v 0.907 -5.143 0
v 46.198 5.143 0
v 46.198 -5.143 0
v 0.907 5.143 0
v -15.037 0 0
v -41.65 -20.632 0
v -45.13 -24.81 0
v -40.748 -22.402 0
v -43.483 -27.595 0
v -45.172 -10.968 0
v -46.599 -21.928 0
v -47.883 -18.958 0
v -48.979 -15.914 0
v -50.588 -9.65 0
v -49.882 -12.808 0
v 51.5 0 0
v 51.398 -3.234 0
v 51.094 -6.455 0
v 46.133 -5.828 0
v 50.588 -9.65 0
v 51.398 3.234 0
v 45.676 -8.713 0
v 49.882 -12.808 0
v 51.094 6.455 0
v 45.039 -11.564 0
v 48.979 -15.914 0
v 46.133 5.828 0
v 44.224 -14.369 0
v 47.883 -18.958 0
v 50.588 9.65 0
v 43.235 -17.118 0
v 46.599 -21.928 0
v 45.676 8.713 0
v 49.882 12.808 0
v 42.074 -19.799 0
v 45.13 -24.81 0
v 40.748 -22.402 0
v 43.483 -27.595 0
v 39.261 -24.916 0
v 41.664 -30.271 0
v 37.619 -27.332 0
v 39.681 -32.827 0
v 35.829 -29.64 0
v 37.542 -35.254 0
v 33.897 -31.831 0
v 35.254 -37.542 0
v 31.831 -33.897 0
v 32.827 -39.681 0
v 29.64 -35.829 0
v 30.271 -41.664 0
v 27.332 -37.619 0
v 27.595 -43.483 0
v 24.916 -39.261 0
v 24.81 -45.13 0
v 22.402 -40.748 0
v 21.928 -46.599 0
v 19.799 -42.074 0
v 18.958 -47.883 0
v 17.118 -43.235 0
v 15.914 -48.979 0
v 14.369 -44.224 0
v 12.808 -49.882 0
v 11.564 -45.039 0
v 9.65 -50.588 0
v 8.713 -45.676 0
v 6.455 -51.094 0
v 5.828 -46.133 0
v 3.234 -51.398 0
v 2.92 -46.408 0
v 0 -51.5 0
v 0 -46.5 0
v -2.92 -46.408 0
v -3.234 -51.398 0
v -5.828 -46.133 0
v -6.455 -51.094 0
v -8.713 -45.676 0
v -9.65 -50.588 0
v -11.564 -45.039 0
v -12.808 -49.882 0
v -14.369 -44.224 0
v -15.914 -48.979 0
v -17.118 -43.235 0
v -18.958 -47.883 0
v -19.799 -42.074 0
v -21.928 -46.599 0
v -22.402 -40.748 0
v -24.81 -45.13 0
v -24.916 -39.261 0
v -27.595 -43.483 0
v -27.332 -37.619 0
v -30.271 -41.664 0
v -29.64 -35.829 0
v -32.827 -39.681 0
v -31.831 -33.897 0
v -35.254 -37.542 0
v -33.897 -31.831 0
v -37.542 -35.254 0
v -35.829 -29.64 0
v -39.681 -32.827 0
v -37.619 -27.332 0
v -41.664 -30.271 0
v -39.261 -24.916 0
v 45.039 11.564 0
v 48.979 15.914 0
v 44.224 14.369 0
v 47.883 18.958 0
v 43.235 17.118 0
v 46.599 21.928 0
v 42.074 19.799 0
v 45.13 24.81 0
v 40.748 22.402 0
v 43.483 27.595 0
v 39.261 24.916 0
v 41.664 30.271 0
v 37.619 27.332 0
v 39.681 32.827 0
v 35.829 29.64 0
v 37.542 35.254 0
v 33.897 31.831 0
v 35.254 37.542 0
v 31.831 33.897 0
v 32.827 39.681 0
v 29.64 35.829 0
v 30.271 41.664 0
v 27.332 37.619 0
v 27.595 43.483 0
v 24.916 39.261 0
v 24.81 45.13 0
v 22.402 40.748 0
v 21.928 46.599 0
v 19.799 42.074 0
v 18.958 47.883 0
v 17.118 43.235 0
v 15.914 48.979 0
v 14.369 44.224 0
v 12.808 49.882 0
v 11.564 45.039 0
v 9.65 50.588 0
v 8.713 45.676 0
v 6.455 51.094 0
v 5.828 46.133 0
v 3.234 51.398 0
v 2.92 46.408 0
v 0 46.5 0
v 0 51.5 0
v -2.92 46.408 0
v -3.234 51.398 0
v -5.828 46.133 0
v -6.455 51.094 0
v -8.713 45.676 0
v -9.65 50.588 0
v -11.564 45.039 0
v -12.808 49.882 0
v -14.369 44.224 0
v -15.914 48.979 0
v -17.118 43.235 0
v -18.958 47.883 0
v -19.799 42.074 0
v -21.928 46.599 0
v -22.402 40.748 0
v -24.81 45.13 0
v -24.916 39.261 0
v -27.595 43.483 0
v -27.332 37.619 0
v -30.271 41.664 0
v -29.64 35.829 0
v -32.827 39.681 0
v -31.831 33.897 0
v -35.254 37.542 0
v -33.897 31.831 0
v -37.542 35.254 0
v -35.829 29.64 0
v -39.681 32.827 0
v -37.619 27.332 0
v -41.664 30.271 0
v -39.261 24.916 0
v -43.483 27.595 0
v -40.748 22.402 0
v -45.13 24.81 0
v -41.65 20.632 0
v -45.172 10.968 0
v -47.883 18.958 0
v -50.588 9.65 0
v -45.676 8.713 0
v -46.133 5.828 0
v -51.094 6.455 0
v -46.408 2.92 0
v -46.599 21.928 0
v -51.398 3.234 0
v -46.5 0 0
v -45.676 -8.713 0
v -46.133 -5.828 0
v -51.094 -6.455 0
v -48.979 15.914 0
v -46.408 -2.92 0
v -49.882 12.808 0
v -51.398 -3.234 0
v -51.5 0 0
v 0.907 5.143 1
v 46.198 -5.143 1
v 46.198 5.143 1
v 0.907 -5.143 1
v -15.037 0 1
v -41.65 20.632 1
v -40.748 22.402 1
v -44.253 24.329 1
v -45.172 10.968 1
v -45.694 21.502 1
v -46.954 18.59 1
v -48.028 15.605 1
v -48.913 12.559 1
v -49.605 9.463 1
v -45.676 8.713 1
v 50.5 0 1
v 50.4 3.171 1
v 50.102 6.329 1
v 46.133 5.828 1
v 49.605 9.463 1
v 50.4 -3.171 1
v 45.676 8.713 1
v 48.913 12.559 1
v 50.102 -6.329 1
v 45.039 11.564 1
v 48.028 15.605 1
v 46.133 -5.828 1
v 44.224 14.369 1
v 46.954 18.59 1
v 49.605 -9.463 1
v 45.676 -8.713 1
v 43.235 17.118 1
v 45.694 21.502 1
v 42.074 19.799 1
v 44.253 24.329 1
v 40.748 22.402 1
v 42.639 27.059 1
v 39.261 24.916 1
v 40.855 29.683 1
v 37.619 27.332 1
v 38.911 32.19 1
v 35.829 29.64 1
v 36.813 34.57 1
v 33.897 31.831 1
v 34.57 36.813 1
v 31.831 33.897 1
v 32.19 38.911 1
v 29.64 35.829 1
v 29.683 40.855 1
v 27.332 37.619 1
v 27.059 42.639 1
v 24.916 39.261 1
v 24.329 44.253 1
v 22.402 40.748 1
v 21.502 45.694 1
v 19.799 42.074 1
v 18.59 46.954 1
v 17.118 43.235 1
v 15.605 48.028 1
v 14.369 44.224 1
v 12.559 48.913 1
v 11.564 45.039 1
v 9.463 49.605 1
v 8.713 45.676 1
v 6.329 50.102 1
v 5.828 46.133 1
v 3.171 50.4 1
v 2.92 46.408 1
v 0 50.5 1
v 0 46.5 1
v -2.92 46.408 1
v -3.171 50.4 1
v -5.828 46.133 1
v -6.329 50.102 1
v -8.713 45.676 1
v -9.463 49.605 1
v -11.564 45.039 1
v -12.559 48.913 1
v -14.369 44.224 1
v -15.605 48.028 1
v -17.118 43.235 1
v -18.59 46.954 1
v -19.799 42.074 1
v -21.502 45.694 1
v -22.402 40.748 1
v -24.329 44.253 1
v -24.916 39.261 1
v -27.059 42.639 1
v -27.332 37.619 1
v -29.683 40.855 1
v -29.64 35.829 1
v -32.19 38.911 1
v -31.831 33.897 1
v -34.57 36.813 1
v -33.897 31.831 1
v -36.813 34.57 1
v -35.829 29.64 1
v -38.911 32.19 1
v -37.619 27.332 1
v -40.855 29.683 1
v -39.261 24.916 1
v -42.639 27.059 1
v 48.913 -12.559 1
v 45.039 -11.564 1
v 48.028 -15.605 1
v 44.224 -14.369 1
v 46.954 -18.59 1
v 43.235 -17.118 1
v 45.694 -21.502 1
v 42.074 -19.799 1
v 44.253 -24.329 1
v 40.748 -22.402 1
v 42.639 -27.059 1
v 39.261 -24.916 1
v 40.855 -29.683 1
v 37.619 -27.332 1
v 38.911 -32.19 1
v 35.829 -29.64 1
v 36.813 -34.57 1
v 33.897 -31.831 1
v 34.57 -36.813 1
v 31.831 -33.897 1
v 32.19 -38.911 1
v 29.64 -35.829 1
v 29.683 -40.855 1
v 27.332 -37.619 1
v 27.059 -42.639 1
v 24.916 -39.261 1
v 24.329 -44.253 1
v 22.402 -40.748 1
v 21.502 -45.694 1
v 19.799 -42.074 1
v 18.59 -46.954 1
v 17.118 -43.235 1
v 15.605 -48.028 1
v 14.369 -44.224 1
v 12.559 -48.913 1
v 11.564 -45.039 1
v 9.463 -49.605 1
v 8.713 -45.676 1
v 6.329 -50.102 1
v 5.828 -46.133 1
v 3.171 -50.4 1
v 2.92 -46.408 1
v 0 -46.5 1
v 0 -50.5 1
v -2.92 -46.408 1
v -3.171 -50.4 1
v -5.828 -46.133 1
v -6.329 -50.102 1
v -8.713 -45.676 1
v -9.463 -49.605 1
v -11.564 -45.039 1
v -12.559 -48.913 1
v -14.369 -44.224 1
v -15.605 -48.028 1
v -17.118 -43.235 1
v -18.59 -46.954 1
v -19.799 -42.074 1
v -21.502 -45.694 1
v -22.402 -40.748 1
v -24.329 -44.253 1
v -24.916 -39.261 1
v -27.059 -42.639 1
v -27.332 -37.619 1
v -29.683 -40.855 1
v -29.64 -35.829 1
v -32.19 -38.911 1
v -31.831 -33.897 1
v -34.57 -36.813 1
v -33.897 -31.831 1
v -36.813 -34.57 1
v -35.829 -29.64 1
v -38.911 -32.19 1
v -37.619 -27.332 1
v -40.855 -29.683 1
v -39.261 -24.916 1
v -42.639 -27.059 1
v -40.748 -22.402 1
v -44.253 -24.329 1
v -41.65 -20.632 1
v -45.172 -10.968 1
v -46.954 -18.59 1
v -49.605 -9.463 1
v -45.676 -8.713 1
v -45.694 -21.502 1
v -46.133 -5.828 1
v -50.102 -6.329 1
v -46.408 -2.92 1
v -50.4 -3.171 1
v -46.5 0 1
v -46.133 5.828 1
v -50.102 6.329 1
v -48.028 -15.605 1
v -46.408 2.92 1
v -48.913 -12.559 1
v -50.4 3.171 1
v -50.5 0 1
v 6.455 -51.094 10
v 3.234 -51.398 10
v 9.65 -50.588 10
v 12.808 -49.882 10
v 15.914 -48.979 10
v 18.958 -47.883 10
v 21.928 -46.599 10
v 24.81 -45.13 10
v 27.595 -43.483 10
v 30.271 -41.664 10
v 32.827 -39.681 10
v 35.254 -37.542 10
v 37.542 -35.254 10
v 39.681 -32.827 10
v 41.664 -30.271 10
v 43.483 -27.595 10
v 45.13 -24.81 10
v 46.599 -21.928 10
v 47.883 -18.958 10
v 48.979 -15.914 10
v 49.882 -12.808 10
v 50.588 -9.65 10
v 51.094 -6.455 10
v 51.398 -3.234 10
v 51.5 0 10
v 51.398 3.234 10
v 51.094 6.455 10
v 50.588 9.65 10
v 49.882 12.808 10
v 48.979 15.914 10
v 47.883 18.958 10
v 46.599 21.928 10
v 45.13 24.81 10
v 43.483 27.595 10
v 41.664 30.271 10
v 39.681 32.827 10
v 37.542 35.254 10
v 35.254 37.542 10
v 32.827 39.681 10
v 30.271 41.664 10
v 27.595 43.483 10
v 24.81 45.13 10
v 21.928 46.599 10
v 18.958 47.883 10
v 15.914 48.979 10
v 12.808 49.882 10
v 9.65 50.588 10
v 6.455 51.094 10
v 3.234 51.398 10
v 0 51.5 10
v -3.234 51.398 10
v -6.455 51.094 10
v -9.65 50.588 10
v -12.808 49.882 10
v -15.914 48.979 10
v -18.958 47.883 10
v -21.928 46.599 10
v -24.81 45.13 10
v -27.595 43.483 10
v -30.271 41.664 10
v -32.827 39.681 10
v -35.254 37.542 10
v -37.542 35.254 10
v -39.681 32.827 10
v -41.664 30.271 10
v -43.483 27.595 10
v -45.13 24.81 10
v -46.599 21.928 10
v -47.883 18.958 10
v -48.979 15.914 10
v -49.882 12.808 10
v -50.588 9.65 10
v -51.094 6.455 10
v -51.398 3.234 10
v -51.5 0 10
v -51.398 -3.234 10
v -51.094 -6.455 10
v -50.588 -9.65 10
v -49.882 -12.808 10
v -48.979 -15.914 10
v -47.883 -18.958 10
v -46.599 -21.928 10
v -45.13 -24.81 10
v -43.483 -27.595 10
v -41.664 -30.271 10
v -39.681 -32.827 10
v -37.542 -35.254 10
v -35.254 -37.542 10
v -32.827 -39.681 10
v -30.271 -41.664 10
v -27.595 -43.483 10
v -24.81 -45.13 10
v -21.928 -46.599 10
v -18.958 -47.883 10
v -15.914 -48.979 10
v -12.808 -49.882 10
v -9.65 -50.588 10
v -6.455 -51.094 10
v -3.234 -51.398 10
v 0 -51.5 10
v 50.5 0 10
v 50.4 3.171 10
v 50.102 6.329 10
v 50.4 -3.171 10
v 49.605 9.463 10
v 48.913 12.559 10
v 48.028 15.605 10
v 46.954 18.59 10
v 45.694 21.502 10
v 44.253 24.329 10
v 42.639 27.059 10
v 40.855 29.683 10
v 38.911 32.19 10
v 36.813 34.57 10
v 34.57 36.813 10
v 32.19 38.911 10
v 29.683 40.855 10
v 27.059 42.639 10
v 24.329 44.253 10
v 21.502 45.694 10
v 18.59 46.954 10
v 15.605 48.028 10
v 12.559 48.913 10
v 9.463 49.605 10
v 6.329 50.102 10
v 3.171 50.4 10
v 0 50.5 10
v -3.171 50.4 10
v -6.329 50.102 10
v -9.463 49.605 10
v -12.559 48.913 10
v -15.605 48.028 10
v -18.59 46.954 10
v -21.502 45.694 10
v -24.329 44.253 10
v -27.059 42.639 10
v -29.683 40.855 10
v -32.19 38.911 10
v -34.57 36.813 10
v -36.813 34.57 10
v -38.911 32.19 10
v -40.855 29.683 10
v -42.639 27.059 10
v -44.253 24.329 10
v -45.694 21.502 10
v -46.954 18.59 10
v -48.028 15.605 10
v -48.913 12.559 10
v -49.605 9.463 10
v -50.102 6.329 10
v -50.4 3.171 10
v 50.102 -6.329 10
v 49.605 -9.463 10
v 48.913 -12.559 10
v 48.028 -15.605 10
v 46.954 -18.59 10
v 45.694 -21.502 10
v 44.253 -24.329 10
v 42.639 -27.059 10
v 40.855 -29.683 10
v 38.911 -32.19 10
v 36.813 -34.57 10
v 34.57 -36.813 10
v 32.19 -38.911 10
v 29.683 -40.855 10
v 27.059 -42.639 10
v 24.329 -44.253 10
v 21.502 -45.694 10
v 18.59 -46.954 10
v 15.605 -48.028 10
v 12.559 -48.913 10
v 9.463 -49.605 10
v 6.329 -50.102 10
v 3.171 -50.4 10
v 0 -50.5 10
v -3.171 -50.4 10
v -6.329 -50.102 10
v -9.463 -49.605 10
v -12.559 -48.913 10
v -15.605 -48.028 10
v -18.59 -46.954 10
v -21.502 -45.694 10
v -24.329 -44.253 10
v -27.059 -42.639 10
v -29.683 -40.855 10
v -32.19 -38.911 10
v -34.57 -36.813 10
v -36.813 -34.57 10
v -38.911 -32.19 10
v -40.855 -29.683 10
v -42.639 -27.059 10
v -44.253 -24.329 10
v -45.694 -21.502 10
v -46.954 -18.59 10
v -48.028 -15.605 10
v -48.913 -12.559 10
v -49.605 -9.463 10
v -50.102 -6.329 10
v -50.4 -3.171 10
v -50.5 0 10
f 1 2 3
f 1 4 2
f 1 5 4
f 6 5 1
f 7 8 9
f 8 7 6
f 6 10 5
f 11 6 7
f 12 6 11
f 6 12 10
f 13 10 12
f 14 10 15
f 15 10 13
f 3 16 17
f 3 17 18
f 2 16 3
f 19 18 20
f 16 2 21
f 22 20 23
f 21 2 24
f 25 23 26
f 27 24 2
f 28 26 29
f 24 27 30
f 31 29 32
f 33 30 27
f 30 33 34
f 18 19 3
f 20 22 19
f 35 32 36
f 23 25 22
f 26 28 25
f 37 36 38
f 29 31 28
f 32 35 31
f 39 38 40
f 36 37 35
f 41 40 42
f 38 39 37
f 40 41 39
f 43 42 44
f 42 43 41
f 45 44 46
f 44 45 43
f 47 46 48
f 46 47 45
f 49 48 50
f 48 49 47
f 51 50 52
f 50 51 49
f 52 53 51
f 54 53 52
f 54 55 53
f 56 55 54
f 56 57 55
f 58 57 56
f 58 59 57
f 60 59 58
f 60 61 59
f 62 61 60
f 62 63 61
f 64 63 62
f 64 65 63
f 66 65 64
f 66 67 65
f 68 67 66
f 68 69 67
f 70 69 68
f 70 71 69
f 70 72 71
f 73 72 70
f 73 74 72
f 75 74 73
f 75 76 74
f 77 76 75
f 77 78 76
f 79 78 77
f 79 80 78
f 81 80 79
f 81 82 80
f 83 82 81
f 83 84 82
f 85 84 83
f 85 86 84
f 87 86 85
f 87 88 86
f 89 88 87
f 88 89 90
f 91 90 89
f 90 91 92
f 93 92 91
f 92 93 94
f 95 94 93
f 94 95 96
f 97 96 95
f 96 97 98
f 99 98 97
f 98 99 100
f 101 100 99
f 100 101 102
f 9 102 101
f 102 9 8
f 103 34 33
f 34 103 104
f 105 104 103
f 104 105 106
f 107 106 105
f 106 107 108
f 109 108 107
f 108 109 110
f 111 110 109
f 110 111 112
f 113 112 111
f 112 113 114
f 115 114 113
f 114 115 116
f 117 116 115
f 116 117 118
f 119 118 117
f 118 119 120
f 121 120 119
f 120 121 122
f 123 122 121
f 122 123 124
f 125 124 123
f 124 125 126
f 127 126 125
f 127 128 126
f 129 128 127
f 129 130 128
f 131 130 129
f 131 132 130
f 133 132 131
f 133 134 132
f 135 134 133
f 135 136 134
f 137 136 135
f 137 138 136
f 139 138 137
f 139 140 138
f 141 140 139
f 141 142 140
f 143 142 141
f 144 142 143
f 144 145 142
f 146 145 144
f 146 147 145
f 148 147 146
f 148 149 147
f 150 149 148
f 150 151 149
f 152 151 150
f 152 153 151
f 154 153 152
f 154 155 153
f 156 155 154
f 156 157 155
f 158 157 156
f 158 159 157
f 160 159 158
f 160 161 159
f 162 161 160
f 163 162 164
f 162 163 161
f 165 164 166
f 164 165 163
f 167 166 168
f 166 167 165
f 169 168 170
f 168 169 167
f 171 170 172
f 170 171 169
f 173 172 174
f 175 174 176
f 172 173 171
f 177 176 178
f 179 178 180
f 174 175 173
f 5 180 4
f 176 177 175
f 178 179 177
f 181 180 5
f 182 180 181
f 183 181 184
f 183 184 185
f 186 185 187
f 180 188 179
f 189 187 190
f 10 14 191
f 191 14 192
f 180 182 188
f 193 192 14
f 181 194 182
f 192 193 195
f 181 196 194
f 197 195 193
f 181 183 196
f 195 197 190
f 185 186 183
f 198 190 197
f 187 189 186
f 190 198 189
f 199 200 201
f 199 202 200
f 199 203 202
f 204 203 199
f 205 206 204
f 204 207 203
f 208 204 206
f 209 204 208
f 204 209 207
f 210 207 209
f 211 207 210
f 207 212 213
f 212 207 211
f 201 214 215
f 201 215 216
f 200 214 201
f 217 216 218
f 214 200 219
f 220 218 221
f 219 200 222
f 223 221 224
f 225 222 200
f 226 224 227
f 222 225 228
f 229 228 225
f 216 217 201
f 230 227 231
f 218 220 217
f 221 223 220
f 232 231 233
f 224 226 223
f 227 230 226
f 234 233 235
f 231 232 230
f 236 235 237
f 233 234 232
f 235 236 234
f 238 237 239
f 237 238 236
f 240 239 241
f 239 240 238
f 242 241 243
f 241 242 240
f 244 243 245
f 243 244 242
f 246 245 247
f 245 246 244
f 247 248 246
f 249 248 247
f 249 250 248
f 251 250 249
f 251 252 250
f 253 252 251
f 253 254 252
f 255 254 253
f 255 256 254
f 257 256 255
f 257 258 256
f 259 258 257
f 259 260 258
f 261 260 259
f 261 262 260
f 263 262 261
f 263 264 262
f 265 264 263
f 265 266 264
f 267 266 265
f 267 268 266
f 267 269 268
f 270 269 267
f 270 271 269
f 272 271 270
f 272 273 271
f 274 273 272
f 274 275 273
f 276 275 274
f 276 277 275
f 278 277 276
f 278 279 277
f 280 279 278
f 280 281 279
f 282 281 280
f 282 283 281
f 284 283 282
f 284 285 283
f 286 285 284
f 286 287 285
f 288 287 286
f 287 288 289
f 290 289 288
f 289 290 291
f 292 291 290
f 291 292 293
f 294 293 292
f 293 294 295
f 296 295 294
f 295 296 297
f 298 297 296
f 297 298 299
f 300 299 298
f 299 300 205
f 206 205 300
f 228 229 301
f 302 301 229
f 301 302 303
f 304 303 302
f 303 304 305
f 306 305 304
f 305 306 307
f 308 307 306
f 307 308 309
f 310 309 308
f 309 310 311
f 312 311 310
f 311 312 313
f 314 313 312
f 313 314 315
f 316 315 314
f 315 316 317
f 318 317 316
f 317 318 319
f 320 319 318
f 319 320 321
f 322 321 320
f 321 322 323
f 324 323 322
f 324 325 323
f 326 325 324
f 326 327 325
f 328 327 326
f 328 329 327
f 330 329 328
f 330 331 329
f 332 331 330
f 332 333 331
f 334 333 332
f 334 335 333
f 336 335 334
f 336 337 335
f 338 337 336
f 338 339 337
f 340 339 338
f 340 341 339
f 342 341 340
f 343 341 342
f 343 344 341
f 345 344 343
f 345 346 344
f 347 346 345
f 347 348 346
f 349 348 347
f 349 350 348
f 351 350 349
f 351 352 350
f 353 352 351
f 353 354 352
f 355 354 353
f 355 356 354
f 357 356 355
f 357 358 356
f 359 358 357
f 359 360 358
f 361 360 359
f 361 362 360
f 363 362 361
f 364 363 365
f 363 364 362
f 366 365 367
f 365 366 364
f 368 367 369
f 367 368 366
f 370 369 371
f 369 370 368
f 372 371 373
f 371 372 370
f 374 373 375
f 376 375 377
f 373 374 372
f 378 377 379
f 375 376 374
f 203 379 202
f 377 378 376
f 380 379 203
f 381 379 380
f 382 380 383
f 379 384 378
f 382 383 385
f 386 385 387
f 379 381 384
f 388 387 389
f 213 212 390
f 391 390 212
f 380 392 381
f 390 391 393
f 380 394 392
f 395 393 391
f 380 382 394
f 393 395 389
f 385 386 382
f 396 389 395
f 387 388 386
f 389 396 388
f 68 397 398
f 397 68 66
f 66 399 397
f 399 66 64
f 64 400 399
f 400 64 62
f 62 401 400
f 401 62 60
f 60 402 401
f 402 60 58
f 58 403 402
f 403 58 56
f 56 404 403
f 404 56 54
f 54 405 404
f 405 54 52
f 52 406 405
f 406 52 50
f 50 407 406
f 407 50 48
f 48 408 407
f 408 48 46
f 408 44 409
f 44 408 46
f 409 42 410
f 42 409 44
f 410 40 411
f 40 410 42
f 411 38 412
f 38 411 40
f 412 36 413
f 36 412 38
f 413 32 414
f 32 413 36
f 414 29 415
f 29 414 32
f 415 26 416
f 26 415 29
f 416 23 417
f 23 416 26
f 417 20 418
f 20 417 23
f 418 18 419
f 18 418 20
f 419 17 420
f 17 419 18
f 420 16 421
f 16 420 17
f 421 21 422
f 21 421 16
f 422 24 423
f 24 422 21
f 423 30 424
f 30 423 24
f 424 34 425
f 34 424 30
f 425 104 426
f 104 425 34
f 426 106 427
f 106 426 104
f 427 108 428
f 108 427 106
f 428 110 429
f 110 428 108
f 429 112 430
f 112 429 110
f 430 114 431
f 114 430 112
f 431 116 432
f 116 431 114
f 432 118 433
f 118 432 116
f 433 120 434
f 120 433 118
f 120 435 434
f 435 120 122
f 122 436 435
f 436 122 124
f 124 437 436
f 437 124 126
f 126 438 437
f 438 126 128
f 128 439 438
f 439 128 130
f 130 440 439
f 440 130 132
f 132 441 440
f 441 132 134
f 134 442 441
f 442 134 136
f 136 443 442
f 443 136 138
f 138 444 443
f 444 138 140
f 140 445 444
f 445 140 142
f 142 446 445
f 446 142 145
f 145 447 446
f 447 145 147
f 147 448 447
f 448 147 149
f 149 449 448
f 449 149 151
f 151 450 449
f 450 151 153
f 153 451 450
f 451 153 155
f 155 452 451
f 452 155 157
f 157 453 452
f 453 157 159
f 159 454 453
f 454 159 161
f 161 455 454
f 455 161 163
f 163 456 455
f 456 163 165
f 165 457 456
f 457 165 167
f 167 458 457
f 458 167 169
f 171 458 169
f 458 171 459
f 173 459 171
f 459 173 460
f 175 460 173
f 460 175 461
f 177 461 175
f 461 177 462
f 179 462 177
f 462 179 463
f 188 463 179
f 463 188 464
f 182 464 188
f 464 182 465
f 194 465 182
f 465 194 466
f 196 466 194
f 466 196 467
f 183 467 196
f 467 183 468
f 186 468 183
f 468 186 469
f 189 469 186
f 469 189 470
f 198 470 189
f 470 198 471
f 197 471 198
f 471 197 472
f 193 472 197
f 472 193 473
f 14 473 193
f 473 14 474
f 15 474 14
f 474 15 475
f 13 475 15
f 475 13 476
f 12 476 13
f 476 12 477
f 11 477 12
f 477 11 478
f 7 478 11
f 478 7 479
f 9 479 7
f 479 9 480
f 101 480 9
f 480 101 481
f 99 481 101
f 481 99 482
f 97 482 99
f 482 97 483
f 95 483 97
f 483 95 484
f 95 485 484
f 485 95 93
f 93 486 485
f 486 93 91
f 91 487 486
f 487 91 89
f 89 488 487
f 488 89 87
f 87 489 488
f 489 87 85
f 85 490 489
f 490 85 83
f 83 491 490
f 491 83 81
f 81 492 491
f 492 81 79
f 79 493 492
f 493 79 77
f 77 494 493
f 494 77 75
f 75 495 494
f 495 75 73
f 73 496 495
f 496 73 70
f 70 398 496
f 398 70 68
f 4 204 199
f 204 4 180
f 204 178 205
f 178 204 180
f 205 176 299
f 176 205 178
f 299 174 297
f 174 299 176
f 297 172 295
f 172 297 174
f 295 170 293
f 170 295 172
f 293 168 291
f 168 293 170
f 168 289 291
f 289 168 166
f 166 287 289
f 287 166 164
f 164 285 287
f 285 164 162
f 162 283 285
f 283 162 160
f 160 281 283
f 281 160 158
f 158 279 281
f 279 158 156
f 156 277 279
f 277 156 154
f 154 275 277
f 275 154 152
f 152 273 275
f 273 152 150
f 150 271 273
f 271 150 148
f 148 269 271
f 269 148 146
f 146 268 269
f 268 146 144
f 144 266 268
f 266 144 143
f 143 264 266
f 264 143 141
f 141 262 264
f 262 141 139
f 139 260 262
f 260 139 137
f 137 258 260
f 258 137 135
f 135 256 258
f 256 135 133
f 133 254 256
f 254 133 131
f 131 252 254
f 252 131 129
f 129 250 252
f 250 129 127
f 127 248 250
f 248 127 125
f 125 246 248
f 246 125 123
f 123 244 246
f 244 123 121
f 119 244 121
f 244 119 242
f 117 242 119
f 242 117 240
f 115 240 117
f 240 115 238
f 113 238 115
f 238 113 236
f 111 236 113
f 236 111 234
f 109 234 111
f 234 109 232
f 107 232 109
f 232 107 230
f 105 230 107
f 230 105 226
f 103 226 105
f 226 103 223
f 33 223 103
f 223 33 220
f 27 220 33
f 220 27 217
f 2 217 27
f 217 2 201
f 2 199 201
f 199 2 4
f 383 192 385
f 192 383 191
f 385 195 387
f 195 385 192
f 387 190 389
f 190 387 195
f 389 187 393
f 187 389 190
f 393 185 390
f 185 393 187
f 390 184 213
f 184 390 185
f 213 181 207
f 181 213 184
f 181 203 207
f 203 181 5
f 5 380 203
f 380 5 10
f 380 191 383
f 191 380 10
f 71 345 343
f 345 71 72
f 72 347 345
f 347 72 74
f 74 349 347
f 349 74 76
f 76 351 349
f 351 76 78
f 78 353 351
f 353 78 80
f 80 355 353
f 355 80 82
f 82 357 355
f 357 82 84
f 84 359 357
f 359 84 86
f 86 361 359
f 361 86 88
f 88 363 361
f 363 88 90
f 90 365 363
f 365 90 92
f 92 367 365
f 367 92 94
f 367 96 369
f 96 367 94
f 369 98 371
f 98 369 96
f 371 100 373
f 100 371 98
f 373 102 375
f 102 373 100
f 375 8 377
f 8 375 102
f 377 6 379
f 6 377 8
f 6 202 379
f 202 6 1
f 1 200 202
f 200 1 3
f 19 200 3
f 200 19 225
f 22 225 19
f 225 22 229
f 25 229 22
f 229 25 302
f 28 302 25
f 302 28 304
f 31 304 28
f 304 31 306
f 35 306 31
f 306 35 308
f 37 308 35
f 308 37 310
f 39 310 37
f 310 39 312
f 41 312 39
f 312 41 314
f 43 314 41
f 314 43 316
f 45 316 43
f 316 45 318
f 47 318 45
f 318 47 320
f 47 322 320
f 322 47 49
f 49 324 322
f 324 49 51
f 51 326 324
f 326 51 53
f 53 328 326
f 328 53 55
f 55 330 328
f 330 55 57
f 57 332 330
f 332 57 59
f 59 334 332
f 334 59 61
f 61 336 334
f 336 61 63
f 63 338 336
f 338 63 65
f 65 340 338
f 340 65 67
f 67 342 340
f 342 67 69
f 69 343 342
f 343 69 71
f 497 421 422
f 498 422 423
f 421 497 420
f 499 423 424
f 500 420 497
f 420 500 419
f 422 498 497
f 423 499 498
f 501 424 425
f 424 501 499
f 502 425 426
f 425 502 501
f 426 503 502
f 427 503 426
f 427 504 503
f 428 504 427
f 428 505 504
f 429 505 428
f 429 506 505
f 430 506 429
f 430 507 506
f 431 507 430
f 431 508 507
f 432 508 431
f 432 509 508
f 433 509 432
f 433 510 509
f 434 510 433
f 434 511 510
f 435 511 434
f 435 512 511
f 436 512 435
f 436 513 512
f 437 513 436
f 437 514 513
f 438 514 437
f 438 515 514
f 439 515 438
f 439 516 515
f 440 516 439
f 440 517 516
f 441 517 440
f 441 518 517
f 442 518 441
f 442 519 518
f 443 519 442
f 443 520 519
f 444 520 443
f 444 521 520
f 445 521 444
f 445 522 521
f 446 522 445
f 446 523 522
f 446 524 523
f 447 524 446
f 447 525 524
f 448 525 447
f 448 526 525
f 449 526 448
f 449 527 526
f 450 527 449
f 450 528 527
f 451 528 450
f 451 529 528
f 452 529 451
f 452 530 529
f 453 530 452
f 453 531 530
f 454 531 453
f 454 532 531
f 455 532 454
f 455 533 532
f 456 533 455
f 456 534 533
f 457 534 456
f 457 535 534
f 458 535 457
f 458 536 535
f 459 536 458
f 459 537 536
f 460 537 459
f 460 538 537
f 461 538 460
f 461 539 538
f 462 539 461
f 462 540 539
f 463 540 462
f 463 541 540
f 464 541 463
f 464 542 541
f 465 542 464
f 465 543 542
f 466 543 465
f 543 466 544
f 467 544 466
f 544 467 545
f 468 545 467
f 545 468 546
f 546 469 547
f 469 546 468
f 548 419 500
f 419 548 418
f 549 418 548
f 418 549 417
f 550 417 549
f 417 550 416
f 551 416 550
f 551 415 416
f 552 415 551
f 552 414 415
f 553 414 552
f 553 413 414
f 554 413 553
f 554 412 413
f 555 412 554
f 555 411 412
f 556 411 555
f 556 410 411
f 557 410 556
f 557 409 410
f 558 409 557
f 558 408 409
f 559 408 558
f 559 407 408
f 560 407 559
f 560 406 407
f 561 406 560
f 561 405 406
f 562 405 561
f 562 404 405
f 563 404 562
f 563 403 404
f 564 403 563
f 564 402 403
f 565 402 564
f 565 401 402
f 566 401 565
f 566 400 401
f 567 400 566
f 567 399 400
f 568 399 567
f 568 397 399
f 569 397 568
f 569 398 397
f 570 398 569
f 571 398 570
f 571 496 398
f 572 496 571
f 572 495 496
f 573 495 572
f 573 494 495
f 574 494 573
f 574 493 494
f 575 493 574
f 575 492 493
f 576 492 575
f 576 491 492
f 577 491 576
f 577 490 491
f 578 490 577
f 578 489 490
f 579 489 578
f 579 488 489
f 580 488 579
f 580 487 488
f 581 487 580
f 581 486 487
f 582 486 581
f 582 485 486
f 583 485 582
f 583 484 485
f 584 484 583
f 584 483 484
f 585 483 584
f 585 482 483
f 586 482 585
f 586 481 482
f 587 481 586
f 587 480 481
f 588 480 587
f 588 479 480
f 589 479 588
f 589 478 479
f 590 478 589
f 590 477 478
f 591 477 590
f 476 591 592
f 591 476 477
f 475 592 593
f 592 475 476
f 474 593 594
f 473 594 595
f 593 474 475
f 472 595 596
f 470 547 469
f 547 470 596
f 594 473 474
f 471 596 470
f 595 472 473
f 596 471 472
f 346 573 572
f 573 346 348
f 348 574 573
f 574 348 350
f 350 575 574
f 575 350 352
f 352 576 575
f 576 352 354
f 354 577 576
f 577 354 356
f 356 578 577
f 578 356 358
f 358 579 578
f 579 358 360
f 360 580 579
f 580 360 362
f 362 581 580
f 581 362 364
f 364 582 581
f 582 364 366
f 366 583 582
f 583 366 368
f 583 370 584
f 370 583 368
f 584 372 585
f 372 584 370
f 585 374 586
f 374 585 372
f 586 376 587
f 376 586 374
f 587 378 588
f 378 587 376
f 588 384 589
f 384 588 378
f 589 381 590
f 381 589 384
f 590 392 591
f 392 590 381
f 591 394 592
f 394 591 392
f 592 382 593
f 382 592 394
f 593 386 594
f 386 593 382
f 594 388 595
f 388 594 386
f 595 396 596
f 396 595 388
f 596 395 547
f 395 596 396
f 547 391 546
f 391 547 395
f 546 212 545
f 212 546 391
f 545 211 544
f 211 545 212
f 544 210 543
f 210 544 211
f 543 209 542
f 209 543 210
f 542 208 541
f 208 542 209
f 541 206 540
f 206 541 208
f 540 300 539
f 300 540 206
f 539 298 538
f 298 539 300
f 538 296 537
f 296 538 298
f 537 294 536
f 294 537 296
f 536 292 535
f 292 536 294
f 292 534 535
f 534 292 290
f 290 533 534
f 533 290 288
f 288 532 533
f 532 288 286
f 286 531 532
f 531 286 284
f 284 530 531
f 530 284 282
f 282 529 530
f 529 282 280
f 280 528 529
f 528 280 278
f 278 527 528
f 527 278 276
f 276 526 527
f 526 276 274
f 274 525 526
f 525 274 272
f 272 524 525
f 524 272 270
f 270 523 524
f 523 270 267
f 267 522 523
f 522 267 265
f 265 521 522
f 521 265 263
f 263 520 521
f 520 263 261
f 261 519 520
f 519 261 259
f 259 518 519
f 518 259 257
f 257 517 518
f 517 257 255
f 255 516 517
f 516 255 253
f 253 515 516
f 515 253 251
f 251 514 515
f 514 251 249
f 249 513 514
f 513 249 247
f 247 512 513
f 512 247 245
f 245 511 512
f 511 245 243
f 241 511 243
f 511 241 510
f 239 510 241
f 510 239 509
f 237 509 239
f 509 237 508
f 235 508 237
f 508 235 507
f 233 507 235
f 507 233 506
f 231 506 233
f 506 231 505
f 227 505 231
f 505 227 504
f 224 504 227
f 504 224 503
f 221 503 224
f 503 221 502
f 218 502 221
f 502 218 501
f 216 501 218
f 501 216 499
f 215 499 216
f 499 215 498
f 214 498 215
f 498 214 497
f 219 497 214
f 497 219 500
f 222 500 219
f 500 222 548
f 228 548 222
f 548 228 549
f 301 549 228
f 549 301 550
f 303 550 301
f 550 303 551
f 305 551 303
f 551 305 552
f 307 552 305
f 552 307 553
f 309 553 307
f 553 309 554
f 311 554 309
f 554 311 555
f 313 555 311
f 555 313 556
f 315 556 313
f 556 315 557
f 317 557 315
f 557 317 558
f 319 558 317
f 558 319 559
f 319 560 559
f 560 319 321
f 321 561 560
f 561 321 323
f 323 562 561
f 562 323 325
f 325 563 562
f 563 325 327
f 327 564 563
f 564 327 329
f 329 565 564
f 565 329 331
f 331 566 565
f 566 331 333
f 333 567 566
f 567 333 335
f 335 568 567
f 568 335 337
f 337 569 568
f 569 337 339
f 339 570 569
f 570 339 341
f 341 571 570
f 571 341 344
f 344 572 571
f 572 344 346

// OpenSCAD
/*
   Y (Lord) Mask
   Andrew Lin, November 2021
*/


/********************
   Settings. 
*********************/

/*
   Number of facets to use when creating shapes. Larger is smoother,
   but will take longer to compute.
*/
$fn = 100;

/*
   Focal length of OTA in millimeters.
   Focal length is the diameter of the main objective multiplied by
   the f-ratio of the OTA. e.g. for an Orion ST80, which has an
   80mm objective, and an f-ratio of 5, the focal length is 400mm.
   (80mm * 5 = 400mm). This value is used the computing the
   thickness of the bars.
*/
focal_length = 400;

/*
   Angle of rotation for angled bars, in degrees.
   The amount to rotate the "off axis" slits. Traditionally, it's
   20 degrees, but you can use whatever value makes focusing easier
   for you.
*/
theta = 20;

/*
   The minimum slit width to print in millimeters. This can be the size of a
   slit your printer can print around without gumming up the slit, or something
   significantly larger if you want a more robust mask that won't easily break.
   The minimum value is probably slightly larger than your print head nozzle
   diameter. This actual width may be slightly larger, based on the step size
   calculation.
*/
minimum_width = 5;

/*
   Diameter of the thing the mask has to fit over, in millimeters.
   This is most likely the outer diameter of the OTA at the
   objective, or end of the lens hood.
*/
ota_diameter = 100;

/*
   Amount of total extra space between the cap's wall and the OTA it
   is going over, in millimeters.
*/
padding = 1;

/*
   Thickness of the mask's outer wall, in millimeters.
*/
wall_thickness = 1;

/*
   Height of the outer wall, in millimeters.
*/
wall_height = 10;

/*
   Thickness of the face of the mask, in millimeters.
*/
face_thickness = 1;

/*
   Width of the solid area on the face between the wall and the
   mask in millimeters.
*/
shoulder = min(10, 0.1 * ota_diameter);


/********************
   Computed Values.
*********************/

/*
   Bahtinov Mask step size formula is from 
   https://www.cloudynights.com/topic/178843-revolutionary-new-way-of-focusing-no-less/
   
   s = f / N
   where
     s = step size.
     f = focal length of OTA.
     N = magic number in [150, 200]
   The step size is the distance for a slit and the following bar, so
   the width of the slit (and the surrounding solids) is s / 2.
   
   The Y-Mask maximizes aperture by removing the grid of slits,
   leaving a single solid of width s / 2 for each set of slits.
*/

/*
   Returns the minimum step size for the mask slits. The conditional
   is whether or not a slit can be printed or not. If the step size
   is too small for the printer, the third-order spectrum. Keep
   increasing to the next third-order spectrum until the slits size
   is printable.
   
   Args:
      s - current step size.
*/
function step_size(s) = s < 2 * minimum_width ? 
    step_size(3 * s) : 
    s;

N = 175;  // Smack in the middle of the range.

/*
   A step includes a slit and a solid. And bar_width is the size of
   a slit.
*/
bar_width = step_size(focal_length / N) / 2;

inner_diameter = ota_diameter + padding;
outer_diameter = inner_diameter + (2 * wall_thickness);


/********************
   Modules.
*********************/

module bar(l, w) {
    translate([0, -w / 2, 0]) square([l, w]);
}

module bars(l, w, theta) {
    union() {
        bar(l, w);
        rotate([0, 0, 180 - theta]) bar(l, w);
        rotate([0, 0, 180 + theta]) bar(l, w);
    }
}

module mask(diameter, width, theta) {
    intersection() {
        circle(d = diameter);
        bars(diameter, width, theta);
    }
}

module face_ring(id, od) {
    difference() {
        circle(d = od);
        circle(d = id);
    }
}

module face(diameter, bar_width, theta, shoulder, thickness) {
    linear_extrude(height = thickness) {
        union() {
            face_ring(diameter - shoulder, diameter);
            mask(diameter, bar_width, theta); 
        }
    }
}

module wall(id, od, h) {
    linear_extrude(height = h) {
        difference() {
            circle(d = od);
            circle(d = id);
        }
    }
}


/********************
   Assembly.
*********************/
union() {
    face(outer_diameter, bar_width, theta, shoulder, face_thickness);
    wall(inner_diameter, outer_diameter, wall_height);
}
